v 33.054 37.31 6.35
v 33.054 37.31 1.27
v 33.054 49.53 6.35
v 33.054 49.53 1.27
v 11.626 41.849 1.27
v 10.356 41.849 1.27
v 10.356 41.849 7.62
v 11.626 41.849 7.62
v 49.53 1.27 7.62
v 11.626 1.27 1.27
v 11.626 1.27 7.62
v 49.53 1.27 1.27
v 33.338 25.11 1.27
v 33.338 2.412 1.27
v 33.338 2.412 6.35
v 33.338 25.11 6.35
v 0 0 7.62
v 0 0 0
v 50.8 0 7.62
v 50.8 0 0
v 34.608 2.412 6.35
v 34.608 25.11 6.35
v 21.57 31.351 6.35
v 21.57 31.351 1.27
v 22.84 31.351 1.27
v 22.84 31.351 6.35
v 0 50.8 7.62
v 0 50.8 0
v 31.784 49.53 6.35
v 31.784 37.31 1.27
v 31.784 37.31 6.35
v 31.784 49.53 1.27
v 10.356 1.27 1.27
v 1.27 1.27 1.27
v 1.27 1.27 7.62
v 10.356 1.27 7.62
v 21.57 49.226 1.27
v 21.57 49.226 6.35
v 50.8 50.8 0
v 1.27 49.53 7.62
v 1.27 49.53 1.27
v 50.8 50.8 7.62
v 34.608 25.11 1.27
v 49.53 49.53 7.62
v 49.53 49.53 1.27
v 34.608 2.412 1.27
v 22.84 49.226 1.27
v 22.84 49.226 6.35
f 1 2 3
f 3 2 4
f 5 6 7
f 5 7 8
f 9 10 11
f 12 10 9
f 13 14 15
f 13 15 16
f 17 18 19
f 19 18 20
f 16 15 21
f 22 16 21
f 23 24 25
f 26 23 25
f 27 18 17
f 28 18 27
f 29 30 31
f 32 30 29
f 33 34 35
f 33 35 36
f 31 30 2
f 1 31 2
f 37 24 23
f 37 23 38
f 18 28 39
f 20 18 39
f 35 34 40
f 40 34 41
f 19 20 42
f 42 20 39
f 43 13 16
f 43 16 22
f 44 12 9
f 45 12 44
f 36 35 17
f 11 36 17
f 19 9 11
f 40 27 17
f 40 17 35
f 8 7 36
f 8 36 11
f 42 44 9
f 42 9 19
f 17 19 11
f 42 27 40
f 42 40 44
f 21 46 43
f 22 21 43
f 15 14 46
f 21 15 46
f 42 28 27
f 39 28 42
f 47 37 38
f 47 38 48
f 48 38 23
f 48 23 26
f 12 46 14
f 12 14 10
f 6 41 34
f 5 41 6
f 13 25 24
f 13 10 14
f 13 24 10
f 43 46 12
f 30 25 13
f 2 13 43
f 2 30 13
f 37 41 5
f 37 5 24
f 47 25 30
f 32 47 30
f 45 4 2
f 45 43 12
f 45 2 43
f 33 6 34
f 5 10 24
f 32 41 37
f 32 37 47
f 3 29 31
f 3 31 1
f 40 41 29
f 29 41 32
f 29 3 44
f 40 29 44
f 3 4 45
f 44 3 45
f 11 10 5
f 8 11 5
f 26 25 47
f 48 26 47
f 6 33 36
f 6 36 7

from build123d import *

# Parameters (mm, degrees)
F0_W     = 50.8
F0_H     = 50.8
F1_DEPTH = 7.62
F2_T     = -1.27
F3_W     = 1.27
F3_H     = 40.579203
F4_DEPTH = 6.35
F5_W     = 1.27
F5_H     = 17.874572
F5_H_2   = 22.697871
F6_DEPTH = 6.35
F7_W     = 1.27
F7_H     = 12.483831
F8_DEPTH = 6.35


with BuildPart() as f1:
    # F0 (on Top) → F1 (new body)
    with BuildSketch(Plane.XY):
        with Locations((25.4, 25.4)):
            Rectangle(F0_W, F0_H)
    extrude(amount=F1_DEPTH)

    # F2
    f2_openings = [f1.faces().sort_by_distance(p)[0] for p in [
        (25.4, 25.4, 7.62),
    ]]
    offset(amount=F2_T, openings=f2_openings)

    # F3 (on face) → F4 (join)
    with BuildSketch(Plane.XY.offset(1.27)):
        with Locations((10.990904, 21.559601)):
            Rectangle(F3_W, F3_H)
    extrude(amount=F4_DEPTH)

    # F5 (on Top) → F6 (join)
    with BuildSketch(Plane.XY):
        with Locations((22.204734, 40.288722)):
            Rectangle(F5_W, F5_H)
        with Locations((33.972504, 13.760585)):
            Rectangle(F5_W, F5_H_2)
    extrude(amount=F6_DEPTH)

    # F7 (on Top) → F8 (join)
    with BuildSketch(Plane.XY):
        with Locations((32.418778, 43.551543)):
            Rectangle(F7_W, F7_H)
    extrude(amount=F8_DEPTH)


solid = f1.part
